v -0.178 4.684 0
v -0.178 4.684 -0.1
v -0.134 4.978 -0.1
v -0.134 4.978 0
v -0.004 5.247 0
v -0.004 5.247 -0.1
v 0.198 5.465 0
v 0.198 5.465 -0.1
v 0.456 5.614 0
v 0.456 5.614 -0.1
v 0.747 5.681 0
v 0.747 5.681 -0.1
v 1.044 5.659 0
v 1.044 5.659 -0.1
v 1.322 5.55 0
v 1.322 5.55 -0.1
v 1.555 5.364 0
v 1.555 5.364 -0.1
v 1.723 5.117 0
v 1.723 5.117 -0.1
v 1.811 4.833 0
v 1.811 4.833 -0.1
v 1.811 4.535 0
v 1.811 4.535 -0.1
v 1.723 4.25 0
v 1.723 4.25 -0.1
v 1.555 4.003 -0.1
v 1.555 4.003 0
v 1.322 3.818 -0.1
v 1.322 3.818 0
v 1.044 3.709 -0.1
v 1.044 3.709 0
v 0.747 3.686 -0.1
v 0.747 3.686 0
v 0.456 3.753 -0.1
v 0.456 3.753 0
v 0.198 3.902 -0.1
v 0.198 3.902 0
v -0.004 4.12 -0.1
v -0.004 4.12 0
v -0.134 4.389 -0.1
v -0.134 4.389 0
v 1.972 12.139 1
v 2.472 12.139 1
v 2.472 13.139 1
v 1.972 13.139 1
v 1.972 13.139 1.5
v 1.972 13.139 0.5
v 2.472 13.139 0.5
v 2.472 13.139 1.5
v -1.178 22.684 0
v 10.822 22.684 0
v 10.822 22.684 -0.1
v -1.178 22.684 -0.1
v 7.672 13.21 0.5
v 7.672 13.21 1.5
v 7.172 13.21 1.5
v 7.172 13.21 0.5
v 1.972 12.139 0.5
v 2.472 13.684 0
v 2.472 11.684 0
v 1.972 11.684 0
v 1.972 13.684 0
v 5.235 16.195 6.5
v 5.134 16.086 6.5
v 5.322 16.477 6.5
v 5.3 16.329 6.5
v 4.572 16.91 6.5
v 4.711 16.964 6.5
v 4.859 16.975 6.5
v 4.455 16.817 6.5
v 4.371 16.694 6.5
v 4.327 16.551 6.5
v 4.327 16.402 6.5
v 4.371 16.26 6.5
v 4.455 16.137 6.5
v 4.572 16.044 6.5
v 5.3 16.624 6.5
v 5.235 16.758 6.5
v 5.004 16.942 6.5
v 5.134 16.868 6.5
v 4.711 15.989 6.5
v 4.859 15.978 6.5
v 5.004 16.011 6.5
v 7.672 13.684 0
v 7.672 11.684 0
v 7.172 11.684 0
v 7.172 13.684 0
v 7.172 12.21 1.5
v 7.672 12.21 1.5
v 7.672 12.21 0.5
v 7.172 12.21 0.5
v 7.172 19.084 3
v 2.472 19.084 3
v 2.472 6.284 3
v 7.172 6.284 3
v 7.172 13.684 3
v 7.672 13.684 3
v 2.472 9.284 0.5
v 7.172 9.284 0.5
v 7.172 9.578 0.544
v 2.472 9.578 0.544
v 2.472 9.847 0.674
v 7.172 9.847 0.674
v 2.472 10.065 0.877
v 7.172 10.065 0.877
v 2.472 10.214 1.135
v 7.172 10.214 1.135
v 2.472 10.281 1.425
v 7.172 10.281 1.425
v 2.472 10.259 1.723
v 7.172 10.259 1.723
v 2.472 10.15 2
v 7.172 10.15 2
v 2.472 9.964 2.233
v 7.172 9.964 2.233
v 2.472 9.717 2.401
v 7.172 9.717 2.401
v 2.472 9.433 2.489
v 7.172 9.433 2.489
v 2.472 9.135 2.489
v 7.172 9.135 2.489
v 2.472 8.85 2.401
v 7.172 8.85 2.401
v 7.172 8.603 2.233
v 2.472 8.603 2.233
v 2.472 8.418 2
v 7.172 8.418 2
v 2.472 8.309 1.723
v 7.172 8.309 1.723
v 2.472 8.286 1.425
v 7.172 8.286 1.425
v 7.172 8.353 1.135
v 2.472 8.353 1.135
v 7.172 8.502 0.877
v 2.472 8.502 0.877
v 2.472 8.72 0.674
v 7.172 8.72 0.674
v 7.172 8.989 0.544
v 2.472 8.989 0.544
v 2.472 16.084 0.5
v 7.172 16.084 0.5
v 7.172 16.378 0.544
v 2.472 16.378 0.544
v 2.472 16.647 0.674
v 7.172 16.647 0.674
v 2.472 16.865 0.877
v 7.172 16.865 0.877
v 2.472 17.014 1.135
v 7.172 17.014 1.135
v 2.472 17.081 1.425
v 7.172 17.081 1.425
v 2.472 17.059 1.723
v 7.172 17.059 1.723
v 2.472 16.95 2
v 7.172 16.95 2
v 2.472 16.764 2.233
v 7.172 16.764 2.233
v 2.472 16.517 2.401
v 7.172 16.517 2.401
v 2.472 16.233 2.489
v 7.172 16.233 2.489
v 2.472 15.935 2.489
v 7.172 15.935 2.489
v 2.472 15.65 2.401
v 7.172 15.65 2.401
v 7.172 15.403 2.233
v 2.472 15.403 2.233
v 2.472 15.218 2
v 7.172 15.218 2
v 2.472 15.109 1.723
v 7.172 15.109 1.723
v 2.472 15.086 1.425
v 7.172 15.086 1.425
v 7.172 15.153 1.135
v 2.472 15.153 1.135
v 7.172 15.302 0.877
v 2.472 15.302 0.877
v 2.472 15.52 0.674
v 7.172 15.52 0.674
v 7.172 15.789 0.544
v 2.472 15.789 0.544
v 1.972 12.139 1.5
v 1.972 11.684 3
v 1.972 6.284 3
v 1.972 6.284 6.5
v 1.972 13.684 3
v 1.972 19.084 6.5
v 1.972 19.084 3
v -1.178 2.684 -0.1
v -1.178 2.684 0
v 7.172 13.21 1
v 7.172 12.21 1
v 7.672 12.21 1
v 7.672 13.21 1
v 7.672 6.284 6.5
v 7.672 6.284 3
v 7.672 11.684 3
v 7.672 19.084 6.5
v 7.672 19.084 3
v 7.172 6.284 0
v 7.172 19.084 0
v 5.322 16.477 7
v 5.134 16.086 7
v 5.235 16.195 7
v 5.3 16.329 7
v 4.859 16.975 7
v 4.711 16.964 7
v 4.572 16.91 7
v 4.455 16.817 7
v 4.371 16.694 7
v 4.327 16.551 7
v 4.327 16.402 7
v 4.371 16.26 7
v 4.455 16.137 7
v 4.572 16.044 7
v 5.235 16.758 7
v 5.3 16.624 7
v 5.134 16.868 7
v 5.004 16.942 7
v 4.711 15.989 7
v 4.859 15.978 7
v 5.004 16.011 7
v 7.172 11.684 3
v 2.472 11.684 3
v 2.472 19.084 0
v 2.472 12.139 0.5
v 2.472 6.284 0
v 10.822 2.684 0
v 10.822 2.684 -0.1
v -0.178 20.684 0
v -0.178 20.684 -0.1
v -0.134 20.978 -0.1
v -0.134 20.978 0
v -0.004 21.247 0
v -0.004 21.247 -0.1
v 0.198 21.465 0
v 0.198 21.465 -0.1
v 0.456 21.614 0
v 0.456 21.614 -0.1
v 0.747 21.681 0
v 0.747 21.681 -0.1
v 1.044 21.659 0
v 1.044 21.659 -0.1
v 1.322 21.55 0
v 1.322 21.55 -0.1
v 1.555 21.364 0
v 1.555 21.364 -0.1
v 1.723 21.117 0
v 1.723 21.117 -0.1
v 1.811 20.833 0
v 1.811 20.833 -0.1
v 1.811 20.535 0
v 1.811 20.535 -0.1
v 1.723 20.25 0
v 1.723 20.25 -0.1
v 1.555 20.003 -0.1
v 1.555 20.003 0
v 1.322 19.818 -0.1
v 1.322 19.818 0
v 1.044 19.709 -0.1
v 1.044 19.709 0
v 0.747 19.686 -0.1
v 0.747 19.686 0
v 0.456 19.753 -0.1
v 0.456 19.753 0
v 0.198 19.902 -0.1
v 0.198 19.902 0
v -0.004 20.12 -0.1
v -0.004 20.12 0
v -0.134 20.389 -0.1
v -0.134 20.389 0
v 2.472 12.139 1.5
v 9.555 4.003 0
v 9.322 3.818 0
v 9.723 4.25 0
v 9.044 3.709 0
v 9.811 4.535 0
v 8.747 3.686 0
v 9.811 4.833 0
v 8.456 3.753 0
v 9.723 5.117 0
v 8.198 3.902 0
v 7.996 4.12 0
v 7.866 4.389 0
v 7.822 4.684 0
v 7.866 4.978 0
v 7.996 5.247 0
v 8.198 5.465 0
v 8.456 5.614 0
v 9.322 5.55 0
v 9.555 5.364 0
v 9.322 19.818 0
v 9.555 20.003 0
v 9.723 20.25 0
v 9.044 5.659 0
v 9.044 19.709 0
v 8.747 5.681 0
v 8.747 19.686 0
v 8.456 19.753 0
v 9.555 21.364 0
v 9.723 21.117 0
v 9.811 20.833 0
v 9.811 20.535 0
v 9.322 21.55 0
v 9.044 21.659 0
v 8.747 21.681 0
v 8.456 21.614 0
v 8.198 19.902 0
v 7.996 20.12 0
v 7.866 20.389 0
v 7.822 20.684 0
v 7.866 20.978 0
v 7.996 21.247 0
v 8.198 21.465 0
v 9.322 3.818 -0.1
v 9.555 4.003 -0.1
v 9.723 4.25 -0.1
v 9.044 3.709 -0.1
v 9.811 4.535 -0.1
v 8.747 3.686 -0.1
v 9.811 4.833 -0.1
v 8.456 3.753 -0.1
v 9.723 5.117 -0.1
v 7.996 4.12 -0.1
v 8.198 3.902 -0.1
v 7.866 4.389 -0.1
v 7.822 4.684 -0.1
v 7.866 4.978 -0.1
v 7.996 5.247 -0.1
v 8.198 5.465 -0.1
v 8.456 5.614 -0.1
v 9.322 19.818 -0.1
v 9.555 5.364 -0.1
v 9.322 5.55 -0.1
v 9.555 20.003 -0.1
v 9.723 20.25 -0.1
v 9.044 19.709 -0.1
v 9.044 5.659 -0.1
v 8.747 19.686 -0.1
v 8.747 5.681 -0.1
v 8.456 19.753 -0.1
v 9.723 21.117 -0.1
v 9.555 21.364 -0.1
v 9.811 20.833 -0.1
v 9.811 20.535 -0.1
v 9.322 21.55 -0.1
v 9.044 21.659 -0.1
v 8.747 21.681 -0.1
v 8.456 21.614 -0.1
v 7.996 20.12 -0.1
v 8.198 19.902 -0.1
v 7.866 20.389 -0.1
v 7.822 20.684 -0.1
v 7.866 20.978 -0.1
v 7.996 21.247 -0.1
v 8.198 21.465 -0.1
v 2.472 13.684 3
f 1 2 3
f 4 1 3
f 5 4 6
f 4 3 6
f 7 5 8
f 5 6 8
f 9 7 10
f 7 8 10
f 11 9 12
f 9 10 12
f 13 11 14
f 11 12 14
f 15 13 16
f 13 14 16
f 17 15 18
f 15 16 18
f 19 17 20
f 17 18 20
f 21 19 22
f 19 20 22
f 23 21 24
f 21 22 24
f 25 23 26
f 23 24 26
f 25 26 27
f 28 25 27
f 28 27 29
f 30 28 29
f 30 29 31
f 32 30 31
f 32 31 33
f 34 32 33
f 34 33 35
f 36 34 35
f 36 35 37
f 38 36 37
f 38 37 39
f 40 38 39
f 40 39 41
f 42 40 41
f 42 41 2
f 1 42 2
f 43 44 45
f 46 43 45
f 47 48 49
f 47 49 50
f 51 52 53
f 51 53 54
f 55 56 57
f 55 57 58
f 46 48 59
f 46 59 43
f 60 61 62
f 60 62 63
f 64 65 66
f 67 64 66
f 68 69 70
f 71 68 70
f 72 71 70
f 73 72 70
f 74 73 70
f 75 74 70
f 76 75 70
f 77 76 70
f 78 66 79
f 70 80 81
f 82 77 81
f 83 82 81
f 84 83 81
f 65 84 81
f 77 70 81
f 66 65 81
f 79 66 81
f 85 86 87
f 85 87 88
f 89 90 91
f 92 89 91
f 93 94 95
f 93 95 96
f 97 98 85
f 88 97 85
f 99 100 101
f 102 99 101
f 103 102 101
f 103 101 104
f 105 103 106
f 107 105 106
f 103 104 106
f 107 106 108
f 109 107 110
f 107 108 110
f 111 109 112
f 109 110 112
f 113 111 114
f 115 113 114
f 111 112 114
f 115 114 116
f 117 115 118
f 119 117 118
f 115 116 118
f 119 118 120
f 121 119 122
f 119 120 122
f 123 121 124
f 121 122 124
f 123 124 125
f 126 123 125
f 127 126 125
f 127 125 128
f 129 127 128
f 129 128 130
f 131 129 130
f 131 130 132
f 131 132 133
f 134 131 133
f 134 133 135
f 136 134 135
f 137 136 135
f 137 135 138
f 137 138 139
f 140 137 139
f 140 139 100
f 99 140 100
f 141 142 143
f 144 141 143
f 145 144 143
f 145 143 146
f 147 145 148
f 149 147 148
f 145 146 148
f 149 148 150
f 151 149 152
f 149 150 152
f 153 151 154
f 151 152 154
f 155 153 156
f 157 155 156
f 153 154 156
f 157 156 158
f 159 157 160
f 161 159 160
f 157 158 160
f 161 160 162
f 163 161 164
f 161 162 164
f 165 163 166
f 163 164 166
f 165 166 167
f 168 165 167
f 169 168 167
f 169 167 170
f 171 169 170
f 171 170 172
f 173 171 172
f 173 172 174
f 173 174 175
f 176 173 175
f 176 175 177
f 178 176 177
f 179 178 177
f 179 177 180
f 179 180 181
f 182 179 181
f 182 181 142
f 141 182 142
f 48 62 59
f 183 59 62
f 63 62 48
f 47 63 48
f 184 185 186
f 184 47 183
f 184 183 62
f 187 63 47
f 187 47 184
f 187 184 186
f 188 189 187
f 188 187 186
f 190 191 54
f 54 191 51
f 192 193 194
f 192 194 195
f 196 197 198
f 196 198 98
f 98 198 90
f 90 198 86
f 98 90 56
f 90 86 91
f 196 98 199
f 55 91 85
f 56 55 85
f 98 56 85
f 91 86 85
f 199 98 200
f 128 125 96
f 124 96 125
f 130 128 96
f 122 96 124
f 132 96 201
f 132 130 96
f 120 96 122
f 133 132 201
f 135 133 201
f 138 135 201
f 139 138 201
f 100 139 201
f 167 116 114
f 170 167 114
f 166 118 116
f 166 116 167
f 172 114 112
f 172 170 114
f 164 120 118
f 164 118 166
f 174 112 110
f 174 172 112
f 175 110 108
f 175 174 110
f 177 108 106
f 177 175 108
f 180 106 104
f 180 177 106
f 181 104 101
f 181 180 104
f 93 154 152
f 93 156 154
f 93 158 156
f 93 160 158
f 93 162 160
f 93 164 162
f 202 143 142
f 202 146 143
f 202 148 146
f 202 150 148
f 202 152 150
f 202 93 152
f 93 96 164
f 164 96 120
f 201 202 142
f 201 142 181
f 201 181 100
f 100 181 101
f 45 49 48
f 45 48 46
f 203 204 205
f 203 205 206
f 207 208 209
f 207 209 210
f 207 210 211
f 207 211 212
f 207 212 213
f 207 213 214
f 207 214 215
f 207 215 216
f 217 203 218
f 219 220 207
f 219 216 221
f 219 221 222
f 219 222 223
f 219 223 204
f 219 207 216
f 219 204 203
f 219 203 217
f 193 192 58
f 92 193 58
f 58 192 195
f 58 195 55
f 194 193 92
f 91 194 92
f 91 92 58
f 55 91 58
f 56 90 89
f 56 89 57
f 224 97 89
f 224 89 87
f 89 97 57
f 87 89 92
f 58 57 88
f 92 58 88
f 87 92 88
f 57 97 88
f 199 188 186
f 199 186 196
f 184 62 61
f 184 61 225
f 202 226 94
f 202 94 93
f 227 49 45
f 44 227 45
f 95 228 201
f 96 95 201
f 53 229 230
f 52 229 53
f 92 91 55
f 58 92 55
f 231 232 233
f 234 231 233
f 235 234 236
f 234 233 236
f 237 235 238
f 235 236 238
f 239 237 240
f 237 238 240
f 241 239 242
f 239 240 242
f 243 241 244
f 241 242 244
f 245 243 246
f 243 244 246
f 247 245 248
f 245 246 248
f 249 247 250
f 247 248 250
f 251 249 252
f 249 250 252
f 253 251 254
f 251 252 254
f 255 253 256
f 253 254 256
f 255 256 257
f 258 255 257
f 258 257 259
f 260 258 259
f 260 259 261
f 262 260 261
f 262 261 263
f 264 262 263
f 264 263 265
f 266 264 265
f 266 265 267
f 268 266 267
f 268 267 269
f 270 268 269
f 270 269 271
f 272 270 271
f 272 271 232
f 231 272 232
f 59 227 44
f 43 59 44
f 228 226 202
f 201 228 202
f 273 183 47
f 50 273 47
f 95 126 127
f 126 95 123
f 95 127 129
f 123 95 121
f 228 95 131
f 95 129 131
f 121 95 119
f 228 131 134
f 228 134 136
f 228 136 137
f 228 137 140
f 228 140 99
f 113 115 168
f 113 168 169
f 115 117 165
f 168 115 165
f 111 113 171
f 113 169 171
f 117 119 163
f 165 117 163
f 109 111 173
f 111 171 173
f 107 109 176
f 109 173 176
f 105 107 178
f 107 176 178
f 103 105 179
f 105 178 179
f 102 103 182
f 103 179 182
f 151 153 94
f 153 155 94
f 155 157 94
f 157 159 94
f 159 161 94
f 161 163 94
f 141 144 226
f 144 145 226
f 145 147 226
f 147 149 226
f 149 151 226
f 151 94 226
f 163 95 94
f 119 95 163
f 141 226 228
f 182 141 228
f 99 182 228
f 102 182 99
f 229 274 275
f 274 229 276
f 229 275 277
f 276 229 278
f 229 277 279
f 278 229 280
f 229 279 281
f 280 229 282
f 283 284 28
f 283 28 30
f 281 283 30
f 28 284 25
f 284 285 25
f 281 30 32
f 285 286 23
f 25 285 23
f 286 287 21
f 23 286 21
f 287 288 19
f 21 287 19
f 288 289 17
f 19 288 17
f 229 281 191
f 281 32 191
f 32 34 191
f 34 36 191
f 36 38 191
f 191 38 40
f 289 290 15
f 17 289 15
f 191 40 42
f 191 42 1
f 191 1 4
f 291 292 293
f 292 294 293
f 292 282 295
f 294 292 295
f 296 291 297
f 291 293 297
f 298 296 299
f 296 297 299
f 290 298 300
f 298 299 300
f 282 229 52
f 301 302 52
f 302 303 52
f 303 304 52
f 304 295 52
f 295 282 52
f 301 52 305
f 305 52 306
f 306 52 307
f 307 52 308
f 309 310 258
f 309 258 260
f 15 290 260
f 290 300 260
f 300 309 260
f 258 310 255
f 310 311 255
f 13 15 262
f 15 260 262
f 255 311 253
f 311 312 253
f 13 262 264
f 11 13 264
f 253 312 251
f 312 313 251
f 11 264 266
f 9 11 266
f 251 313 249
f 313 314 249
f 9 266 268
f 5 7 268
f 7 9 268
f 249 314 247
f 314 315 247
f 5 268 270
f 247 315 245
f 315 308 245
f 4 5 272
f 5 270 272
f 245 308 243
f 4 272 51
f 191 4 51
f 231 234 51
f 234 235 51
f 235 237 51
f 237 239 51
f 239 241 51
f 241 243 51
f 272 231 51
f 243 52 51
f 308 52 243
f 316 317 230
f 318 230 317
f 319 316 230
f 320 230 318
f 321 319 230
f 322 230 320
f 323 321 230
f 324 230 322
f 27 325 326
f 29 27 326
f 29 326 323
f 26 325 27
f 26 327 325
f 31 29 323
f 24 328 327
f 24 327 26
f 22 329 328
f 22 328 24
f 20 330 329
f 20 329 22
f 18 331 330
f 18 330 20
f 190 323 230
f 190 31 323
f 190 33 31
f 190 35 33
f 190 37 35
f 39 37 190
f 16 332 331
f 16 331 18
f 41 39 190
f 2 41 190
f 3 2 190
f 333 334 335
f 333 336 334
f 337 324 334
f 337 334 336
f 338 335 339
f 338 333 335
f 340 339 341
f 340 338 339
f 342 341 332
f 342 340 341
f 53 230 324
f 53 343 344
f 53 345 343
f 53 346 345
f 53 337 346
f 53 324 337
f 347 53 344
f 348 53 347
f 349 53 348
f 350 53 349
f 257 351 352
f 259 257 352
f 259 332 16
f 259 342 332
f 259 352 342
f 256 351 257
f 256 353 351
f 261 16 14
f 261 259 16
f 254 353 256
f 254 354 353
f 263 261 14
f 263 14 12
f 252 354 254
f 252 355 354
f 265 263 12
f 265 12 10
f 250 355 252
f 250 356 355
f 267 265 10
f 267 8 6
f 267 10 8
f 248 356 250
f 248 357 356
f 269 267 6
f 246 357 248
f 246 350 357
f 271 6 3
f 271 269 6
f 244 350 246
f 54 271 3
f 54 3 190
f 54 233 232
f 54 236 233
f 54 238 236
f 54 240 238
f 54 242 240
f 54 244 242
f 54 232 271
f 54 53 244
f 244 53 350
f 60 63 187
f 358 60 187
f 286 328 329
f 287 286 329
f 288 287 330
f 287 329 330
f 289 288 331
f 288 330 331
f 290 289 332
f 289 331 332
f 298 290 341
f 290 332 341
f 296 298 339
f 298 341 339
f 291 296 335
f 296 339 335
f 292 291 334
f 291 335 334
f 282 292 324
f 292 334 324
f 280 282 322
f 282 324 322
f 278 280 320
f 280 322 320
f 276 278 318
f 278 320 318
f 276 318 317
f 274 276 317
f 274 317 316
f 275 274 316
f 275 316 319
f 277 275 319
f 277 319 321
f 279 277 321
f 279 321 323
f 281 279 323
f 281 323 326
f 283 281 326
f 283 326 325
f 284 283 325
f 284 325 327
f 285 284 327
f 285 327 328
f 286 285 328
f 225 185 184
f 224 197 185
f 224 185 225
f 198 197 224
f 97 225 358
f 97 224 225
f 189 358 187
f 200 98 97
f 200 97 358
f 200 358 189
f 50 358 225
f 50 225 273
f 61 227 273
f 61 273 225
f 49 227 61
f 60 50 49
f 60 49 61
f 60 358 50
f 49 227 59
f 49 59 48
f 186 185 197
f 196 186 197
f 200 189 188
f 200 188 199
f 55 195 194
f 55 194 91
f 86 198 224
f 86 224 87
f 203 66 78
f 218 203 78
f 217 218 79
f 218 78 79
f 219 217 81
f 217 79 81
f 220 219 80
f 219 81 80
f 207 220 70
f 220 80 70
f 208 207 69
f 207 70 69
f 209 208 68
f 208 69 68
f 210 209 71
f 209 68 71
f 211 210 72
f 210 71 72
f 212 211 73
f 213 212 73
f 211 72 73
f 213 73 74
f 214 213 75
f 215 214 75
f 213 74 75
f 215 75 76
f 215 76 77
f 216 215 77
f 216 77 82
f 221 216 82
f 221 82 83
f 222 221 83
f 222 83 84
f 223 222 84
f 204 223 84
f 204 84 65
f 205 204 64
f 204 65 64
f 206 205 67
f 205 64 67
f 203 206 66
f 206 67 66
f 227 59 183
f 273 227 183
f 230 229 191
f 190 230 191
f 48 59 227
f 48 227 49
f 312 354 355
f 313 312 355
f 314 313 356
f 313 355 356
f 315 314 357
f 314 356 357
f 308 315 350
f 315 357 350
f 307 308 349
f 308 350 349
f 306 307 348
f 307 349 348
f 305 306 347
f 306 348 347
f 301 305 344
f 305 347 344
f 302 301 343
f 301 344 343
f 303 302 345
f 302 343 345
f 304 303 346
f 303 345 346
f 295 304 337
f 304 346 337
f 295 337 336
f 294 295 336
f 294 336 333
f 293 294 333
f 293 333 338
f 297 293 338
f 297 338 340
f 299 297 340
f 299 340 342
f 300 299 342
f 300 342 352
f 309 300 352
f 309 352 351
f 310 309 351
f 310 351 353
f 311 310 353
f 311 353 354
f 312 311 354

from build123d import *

# Parameters (mm, degrees)
SKETCH1_W            = 5.7
SKETCH1_H            = 12.8
BOSS_EXTRUDE2_DEPTH  = 6.5
SKETCH3_R            = 0.575
BOSS_EXTRUDE3_DEPTH  = 0.5
SKETCH7_W            = 3
SKETCH7_H            = 12.8
CUT_EXTRUDE1_DEPTH   = 0.5
SKETCH8_W            = 3
SKETCH8_H            = 12.8
CUT_EXTRUDE2_DEPTH   = 0.5
SKETCH9_R            = 1
CUT_EXTRUDE3_DEPTH   = 6.2
SKETCH10_W           = 6
SKETCH10_H           = 2
BOSS_EXTRUDE4_DEPTH  = 0.5
SKETCH11_W           = 6
SKETCH11_H           = 2
BOSS_EXTRUDE6_DEPTH  = 0.5
SKETCH13_W           = 4.7
SKETCH13_H           = 3
CUT_EXTRUDE4_DEPTH   = 13.8
SKETCH16_W           = 4.7
SKETCH16_H           = 3
BOSS_EXTRUDE8_DEPTH  = 12.8
SKETCH17_R           = 1
CUT_EXTRUDE5_DEPTH   = 6.2
SKETCH18_R           = 0.575
CUT_EXTRUDE6_DEPTH   = 0.5
SKETCH19_R           = 0.5
BOSS_EXTRUDE9_DEPTH  = 0.5
SKETCH20_W           = 1
SKETCH20_H           = 1
CUT_EXTRUDE8_DEPTH   = 0.5
SKETCH21_W           = 0.5
SKETCH21_H           = 1
BOSS_EXTRUDE11_DEPTH = 0.5
SKETCH22_W           = 1
SKETCH22_H           = 1
CUT_EXTRUDE9_DEPTH   = 0.5
SKETCH23_W           = 0.5
SKETCH23_H           = 1
BOSS_EXTRUDE13_DEPTH = 0.5
SKETCH28_W           = 12
SKETCH28_H           = 20
BOSS_EXTRUDE15_DEPTH = 0.1
SKETCH29_R           = 1
CUT_EXTRUDE10_DEPTH  = 10.1


with BuildPart() as part:
    # Sketch1 → Boss-Extrude2 (new body)
    with BuildSketch(Plane.XY):
        with Locations((4.821797151, 12.683595414)):
            Rectangle(SKETCH1_W, SKETCH1_H)
    extrude(amount=BOSS_EXTRUDE2_DEPTH)

    # Sketch3 → Boss-Extrude3 (add)
    with BuildSketch(Plane.XY.offset(6.5)):
        with Locations((4.821797151, 16.601773498)):
            Circle(SKETCH3_R)
    extrude(amount=BOSS_EXTRUDE3_DEPTH)

    # Sketch7 → Cut-Extrude1 (cut)
    with BuildSketch(Plane(origin=(7.671797151, 0, 0), x_dir=(0, 0, -1), z_dir=(1, 0, 0))):
        with Locations((-1.5, 12.683595414)):
            Rectangle(SKETCH7_W, SKETCH7_H)
    extrude(amount=-CUT_EXTRUDE1_DEPTH, mode=Mode.SUBTRACT)

    # Sketch8 → Cut-Extrude2 (cut)
    with BuildSketch(Plane.ZY.offset(-1.971797151)):
        with Locations((1.5, 12.683595414)):
            Rectangle(SKETCH8_W, SKETCH8_H)
    extrude(amount=-CUT_EXTRUDE2_DEPTH, mode=Mode.SUBTRACT)

    # Sketch9 → Cut-Extrude3 (cut, through all)
    with BuildSketch(Plane(origin=(7.171797151, 0, 0), x_dir=(0, 0, -1), z_dir=(1, 0, 0))):
        with Locations((-1.661401628, 9.783595414)):
            Circle(SKETCH9_R)
        with Locations((-1.661401628, 15.583595414)):
            Circle(SKETCH9_R)
    extrude(amount=-CUT_EXTRUDE3_DEPTH, mode=Mode.SUBTRACT)

    # Sketch10 → Boss-Extrude4 (add)
    with BuildSketch(Plane.ZY.offset(-1.971797151)):
        with Locations((3, 12.683595414)):
            Rectangle(SKETCH10_W, SKETCH10_H)
    extrude(amount=-BOSS_EXTRUDE4_DEPTH)

    # Sketch11 → Boss-Extrude6 (add)
    with BuildSketch(Plane(origin=(7.671797151, 0, 0), x_dir=(0, 0, -1), z_dir=(1, 0, 0))):
        with Locations((-3, 12.683595414)):
            Rectangle(SKETCH11_W, SKETCH11_H)
    extrude(amount=-BOSS_EXTRUDE6_DEPTH)

    # Sketch13 → Cut-Extrude4 (cut, through all)
    with BuildSketch(Plane(origin=(0, 19.083595414, 0), x_dir=(1, 0, 0), z_dir=(0, 1, 0))):
        with Locations((4.821797151, -1.5)):
            Rectangle(SKETCH13_W, SKETCH13_H)
    extrude(amount=-CUT_EXTRUDE4_DEPTH, mode=Mode.SUBTRACT)

    # Sketch18 → Cut-Extrude6 (cut)
    with BuildSketch(Plane.XY.offset(7)):
        with Locations((4.821797151, 16.601773498)):
            Circle(SKETCH18_R)
    extrude(amount=-CUT_EXTRUDE6_DEPTH, mode=Mode.SUBTRACT)

    # Sketch20 → Cut-Extrude8 (cut)
    with BuildSketch(Plane(origin=(7.671797151, 0, 0), x_dir=(0, 0, -1), z_dir=(1, 0, 0))):
        with Locations((-1, 12.709770328)):
            Rectangle(SKETCH20_W, SKETCH20_H)
    extrude(amount=-CUT_EXTRUDE8_DEPTH, mode=Mode.SUBTRACT)

    # Sketch22 → Cut-Extrude9 (cut)
    with BuildSketch(Plane.ZY.offset(-1.971797151)):
        with Locations((1, 12.639196458)):
            Rectangle(SKETCH22_W, SKETCH22_H)
    extrude(amount=-CUT_EXTRUDE9_DEPTH, mode=Mode.SUBTRACT)


with BuildPart() as body_2:
    # Sketch16 → Boss-Extrude8 (new body)
    with BuildSketch(Plane(origin=(0, 19.083595414, 0), x_dir=(1, 0, 0), z_dir=(0, 1, 0))):
        with Locations((4.821797151, -1.5)):
            Rectangle(SKETCH16_W, SKETCH16_H)
    extrude(amount=-BOSS_EXTRUDE8_DEPTH)

    # Sketch17 → Cut-Extrude5 (cut, through all)
    with BuildSketch(Plane(origin=(7.171797151, 0, 0), x_dir=(0, 0, -1), z_dir=(1, 0, 0))):
        with Locations((-1.5, 16.083595414)):
            Circle(SKETCH17_R)
        with Locations((-1.5, 9.283595414)):
            Circle(SKETCH17_R)
    extrude(amount=-CUT_EXTRUDE5_DEPTH, mode=Mode.SUBTRACT)


with BuildPart() as body_3:
    # Sketch19 → Boss-Extrude9 (new body)
    with BuildSketch(Plane.XY.offset(6.5)):
        with Locations((4.821797151, 16.476820211)):
            Circle(SKETCH19_R)
    extrude(amount=BOSS_EXTRUDE9_DEPTH)


with BuildPart() as body_4:
    # Sketch21 → Boss-Extrude11 (new body)
    with BuildSketch(Plane(origin=(7.171797151, 0, 0), x_dir=(0, 0, -1), z_dir=(1, 0, 0))):
        with Locations((-0.75, 12.709770328)):
            Rectangle(SKETCH21_W, SKETCH21_H)
    extrude(amount=BOSS_EXTRUDE11_DEPTH)


with BuildPart() as body_5:
    # Sketch23 → Boss-Extrude13 (new body)
    with BuildSketch(Plane.ZY.offset(-2.471797151)):
        with Locations((0.75, 12.639196458)):
            Rectangle(SKETCH23_W, SKETCH23_H)
    extrude(amount=BOSS_EXTRUDE13_DEPTH)


with BuildPart() as body_6:
    # Sketch28 → Boss-Extrude15 (new body)
    with BuildSketch(Plane(origin=(0, 0, 0), x_dir=(-1, 0, 0), z_dir=(0, 0, -1))):
        with Locations((-4.821797151, 12.683595414)):
            Rectangle(SKETCH28_W, SKETCH28_H)
    extrude(amount=BOSS_EXTRUDE15_DEPTH)

    # Sketch29 → Cut-Extrude10 (cut)
    with BuildSketch(Plane(origin=(0, 0, -0.1), x_dir=(-1, 0, 0), z_dir=(0, 0, -1))):
        with Locations((-8.821797151, 20.683595414)):
            Circle(SKETCH29_R)
        with Locations((-8.821797151, 4.683595414)):
            Circle(SKETCH29_R)
        with Locations((-0.821797151, 4.683595414)):
            Circle(SKETCH29_R)
        with Locations((-0.821797151, 20.683595414)):
            Circle(SKETCH29_R)
    extrude(amount=-CUT_EXTRUDE10_DEPTH, mode=Mode.SUBTRACT)


solid = Compound([part.part, body_2.part, body_3.part, body_4.part, body_5.part, body_6.part])
